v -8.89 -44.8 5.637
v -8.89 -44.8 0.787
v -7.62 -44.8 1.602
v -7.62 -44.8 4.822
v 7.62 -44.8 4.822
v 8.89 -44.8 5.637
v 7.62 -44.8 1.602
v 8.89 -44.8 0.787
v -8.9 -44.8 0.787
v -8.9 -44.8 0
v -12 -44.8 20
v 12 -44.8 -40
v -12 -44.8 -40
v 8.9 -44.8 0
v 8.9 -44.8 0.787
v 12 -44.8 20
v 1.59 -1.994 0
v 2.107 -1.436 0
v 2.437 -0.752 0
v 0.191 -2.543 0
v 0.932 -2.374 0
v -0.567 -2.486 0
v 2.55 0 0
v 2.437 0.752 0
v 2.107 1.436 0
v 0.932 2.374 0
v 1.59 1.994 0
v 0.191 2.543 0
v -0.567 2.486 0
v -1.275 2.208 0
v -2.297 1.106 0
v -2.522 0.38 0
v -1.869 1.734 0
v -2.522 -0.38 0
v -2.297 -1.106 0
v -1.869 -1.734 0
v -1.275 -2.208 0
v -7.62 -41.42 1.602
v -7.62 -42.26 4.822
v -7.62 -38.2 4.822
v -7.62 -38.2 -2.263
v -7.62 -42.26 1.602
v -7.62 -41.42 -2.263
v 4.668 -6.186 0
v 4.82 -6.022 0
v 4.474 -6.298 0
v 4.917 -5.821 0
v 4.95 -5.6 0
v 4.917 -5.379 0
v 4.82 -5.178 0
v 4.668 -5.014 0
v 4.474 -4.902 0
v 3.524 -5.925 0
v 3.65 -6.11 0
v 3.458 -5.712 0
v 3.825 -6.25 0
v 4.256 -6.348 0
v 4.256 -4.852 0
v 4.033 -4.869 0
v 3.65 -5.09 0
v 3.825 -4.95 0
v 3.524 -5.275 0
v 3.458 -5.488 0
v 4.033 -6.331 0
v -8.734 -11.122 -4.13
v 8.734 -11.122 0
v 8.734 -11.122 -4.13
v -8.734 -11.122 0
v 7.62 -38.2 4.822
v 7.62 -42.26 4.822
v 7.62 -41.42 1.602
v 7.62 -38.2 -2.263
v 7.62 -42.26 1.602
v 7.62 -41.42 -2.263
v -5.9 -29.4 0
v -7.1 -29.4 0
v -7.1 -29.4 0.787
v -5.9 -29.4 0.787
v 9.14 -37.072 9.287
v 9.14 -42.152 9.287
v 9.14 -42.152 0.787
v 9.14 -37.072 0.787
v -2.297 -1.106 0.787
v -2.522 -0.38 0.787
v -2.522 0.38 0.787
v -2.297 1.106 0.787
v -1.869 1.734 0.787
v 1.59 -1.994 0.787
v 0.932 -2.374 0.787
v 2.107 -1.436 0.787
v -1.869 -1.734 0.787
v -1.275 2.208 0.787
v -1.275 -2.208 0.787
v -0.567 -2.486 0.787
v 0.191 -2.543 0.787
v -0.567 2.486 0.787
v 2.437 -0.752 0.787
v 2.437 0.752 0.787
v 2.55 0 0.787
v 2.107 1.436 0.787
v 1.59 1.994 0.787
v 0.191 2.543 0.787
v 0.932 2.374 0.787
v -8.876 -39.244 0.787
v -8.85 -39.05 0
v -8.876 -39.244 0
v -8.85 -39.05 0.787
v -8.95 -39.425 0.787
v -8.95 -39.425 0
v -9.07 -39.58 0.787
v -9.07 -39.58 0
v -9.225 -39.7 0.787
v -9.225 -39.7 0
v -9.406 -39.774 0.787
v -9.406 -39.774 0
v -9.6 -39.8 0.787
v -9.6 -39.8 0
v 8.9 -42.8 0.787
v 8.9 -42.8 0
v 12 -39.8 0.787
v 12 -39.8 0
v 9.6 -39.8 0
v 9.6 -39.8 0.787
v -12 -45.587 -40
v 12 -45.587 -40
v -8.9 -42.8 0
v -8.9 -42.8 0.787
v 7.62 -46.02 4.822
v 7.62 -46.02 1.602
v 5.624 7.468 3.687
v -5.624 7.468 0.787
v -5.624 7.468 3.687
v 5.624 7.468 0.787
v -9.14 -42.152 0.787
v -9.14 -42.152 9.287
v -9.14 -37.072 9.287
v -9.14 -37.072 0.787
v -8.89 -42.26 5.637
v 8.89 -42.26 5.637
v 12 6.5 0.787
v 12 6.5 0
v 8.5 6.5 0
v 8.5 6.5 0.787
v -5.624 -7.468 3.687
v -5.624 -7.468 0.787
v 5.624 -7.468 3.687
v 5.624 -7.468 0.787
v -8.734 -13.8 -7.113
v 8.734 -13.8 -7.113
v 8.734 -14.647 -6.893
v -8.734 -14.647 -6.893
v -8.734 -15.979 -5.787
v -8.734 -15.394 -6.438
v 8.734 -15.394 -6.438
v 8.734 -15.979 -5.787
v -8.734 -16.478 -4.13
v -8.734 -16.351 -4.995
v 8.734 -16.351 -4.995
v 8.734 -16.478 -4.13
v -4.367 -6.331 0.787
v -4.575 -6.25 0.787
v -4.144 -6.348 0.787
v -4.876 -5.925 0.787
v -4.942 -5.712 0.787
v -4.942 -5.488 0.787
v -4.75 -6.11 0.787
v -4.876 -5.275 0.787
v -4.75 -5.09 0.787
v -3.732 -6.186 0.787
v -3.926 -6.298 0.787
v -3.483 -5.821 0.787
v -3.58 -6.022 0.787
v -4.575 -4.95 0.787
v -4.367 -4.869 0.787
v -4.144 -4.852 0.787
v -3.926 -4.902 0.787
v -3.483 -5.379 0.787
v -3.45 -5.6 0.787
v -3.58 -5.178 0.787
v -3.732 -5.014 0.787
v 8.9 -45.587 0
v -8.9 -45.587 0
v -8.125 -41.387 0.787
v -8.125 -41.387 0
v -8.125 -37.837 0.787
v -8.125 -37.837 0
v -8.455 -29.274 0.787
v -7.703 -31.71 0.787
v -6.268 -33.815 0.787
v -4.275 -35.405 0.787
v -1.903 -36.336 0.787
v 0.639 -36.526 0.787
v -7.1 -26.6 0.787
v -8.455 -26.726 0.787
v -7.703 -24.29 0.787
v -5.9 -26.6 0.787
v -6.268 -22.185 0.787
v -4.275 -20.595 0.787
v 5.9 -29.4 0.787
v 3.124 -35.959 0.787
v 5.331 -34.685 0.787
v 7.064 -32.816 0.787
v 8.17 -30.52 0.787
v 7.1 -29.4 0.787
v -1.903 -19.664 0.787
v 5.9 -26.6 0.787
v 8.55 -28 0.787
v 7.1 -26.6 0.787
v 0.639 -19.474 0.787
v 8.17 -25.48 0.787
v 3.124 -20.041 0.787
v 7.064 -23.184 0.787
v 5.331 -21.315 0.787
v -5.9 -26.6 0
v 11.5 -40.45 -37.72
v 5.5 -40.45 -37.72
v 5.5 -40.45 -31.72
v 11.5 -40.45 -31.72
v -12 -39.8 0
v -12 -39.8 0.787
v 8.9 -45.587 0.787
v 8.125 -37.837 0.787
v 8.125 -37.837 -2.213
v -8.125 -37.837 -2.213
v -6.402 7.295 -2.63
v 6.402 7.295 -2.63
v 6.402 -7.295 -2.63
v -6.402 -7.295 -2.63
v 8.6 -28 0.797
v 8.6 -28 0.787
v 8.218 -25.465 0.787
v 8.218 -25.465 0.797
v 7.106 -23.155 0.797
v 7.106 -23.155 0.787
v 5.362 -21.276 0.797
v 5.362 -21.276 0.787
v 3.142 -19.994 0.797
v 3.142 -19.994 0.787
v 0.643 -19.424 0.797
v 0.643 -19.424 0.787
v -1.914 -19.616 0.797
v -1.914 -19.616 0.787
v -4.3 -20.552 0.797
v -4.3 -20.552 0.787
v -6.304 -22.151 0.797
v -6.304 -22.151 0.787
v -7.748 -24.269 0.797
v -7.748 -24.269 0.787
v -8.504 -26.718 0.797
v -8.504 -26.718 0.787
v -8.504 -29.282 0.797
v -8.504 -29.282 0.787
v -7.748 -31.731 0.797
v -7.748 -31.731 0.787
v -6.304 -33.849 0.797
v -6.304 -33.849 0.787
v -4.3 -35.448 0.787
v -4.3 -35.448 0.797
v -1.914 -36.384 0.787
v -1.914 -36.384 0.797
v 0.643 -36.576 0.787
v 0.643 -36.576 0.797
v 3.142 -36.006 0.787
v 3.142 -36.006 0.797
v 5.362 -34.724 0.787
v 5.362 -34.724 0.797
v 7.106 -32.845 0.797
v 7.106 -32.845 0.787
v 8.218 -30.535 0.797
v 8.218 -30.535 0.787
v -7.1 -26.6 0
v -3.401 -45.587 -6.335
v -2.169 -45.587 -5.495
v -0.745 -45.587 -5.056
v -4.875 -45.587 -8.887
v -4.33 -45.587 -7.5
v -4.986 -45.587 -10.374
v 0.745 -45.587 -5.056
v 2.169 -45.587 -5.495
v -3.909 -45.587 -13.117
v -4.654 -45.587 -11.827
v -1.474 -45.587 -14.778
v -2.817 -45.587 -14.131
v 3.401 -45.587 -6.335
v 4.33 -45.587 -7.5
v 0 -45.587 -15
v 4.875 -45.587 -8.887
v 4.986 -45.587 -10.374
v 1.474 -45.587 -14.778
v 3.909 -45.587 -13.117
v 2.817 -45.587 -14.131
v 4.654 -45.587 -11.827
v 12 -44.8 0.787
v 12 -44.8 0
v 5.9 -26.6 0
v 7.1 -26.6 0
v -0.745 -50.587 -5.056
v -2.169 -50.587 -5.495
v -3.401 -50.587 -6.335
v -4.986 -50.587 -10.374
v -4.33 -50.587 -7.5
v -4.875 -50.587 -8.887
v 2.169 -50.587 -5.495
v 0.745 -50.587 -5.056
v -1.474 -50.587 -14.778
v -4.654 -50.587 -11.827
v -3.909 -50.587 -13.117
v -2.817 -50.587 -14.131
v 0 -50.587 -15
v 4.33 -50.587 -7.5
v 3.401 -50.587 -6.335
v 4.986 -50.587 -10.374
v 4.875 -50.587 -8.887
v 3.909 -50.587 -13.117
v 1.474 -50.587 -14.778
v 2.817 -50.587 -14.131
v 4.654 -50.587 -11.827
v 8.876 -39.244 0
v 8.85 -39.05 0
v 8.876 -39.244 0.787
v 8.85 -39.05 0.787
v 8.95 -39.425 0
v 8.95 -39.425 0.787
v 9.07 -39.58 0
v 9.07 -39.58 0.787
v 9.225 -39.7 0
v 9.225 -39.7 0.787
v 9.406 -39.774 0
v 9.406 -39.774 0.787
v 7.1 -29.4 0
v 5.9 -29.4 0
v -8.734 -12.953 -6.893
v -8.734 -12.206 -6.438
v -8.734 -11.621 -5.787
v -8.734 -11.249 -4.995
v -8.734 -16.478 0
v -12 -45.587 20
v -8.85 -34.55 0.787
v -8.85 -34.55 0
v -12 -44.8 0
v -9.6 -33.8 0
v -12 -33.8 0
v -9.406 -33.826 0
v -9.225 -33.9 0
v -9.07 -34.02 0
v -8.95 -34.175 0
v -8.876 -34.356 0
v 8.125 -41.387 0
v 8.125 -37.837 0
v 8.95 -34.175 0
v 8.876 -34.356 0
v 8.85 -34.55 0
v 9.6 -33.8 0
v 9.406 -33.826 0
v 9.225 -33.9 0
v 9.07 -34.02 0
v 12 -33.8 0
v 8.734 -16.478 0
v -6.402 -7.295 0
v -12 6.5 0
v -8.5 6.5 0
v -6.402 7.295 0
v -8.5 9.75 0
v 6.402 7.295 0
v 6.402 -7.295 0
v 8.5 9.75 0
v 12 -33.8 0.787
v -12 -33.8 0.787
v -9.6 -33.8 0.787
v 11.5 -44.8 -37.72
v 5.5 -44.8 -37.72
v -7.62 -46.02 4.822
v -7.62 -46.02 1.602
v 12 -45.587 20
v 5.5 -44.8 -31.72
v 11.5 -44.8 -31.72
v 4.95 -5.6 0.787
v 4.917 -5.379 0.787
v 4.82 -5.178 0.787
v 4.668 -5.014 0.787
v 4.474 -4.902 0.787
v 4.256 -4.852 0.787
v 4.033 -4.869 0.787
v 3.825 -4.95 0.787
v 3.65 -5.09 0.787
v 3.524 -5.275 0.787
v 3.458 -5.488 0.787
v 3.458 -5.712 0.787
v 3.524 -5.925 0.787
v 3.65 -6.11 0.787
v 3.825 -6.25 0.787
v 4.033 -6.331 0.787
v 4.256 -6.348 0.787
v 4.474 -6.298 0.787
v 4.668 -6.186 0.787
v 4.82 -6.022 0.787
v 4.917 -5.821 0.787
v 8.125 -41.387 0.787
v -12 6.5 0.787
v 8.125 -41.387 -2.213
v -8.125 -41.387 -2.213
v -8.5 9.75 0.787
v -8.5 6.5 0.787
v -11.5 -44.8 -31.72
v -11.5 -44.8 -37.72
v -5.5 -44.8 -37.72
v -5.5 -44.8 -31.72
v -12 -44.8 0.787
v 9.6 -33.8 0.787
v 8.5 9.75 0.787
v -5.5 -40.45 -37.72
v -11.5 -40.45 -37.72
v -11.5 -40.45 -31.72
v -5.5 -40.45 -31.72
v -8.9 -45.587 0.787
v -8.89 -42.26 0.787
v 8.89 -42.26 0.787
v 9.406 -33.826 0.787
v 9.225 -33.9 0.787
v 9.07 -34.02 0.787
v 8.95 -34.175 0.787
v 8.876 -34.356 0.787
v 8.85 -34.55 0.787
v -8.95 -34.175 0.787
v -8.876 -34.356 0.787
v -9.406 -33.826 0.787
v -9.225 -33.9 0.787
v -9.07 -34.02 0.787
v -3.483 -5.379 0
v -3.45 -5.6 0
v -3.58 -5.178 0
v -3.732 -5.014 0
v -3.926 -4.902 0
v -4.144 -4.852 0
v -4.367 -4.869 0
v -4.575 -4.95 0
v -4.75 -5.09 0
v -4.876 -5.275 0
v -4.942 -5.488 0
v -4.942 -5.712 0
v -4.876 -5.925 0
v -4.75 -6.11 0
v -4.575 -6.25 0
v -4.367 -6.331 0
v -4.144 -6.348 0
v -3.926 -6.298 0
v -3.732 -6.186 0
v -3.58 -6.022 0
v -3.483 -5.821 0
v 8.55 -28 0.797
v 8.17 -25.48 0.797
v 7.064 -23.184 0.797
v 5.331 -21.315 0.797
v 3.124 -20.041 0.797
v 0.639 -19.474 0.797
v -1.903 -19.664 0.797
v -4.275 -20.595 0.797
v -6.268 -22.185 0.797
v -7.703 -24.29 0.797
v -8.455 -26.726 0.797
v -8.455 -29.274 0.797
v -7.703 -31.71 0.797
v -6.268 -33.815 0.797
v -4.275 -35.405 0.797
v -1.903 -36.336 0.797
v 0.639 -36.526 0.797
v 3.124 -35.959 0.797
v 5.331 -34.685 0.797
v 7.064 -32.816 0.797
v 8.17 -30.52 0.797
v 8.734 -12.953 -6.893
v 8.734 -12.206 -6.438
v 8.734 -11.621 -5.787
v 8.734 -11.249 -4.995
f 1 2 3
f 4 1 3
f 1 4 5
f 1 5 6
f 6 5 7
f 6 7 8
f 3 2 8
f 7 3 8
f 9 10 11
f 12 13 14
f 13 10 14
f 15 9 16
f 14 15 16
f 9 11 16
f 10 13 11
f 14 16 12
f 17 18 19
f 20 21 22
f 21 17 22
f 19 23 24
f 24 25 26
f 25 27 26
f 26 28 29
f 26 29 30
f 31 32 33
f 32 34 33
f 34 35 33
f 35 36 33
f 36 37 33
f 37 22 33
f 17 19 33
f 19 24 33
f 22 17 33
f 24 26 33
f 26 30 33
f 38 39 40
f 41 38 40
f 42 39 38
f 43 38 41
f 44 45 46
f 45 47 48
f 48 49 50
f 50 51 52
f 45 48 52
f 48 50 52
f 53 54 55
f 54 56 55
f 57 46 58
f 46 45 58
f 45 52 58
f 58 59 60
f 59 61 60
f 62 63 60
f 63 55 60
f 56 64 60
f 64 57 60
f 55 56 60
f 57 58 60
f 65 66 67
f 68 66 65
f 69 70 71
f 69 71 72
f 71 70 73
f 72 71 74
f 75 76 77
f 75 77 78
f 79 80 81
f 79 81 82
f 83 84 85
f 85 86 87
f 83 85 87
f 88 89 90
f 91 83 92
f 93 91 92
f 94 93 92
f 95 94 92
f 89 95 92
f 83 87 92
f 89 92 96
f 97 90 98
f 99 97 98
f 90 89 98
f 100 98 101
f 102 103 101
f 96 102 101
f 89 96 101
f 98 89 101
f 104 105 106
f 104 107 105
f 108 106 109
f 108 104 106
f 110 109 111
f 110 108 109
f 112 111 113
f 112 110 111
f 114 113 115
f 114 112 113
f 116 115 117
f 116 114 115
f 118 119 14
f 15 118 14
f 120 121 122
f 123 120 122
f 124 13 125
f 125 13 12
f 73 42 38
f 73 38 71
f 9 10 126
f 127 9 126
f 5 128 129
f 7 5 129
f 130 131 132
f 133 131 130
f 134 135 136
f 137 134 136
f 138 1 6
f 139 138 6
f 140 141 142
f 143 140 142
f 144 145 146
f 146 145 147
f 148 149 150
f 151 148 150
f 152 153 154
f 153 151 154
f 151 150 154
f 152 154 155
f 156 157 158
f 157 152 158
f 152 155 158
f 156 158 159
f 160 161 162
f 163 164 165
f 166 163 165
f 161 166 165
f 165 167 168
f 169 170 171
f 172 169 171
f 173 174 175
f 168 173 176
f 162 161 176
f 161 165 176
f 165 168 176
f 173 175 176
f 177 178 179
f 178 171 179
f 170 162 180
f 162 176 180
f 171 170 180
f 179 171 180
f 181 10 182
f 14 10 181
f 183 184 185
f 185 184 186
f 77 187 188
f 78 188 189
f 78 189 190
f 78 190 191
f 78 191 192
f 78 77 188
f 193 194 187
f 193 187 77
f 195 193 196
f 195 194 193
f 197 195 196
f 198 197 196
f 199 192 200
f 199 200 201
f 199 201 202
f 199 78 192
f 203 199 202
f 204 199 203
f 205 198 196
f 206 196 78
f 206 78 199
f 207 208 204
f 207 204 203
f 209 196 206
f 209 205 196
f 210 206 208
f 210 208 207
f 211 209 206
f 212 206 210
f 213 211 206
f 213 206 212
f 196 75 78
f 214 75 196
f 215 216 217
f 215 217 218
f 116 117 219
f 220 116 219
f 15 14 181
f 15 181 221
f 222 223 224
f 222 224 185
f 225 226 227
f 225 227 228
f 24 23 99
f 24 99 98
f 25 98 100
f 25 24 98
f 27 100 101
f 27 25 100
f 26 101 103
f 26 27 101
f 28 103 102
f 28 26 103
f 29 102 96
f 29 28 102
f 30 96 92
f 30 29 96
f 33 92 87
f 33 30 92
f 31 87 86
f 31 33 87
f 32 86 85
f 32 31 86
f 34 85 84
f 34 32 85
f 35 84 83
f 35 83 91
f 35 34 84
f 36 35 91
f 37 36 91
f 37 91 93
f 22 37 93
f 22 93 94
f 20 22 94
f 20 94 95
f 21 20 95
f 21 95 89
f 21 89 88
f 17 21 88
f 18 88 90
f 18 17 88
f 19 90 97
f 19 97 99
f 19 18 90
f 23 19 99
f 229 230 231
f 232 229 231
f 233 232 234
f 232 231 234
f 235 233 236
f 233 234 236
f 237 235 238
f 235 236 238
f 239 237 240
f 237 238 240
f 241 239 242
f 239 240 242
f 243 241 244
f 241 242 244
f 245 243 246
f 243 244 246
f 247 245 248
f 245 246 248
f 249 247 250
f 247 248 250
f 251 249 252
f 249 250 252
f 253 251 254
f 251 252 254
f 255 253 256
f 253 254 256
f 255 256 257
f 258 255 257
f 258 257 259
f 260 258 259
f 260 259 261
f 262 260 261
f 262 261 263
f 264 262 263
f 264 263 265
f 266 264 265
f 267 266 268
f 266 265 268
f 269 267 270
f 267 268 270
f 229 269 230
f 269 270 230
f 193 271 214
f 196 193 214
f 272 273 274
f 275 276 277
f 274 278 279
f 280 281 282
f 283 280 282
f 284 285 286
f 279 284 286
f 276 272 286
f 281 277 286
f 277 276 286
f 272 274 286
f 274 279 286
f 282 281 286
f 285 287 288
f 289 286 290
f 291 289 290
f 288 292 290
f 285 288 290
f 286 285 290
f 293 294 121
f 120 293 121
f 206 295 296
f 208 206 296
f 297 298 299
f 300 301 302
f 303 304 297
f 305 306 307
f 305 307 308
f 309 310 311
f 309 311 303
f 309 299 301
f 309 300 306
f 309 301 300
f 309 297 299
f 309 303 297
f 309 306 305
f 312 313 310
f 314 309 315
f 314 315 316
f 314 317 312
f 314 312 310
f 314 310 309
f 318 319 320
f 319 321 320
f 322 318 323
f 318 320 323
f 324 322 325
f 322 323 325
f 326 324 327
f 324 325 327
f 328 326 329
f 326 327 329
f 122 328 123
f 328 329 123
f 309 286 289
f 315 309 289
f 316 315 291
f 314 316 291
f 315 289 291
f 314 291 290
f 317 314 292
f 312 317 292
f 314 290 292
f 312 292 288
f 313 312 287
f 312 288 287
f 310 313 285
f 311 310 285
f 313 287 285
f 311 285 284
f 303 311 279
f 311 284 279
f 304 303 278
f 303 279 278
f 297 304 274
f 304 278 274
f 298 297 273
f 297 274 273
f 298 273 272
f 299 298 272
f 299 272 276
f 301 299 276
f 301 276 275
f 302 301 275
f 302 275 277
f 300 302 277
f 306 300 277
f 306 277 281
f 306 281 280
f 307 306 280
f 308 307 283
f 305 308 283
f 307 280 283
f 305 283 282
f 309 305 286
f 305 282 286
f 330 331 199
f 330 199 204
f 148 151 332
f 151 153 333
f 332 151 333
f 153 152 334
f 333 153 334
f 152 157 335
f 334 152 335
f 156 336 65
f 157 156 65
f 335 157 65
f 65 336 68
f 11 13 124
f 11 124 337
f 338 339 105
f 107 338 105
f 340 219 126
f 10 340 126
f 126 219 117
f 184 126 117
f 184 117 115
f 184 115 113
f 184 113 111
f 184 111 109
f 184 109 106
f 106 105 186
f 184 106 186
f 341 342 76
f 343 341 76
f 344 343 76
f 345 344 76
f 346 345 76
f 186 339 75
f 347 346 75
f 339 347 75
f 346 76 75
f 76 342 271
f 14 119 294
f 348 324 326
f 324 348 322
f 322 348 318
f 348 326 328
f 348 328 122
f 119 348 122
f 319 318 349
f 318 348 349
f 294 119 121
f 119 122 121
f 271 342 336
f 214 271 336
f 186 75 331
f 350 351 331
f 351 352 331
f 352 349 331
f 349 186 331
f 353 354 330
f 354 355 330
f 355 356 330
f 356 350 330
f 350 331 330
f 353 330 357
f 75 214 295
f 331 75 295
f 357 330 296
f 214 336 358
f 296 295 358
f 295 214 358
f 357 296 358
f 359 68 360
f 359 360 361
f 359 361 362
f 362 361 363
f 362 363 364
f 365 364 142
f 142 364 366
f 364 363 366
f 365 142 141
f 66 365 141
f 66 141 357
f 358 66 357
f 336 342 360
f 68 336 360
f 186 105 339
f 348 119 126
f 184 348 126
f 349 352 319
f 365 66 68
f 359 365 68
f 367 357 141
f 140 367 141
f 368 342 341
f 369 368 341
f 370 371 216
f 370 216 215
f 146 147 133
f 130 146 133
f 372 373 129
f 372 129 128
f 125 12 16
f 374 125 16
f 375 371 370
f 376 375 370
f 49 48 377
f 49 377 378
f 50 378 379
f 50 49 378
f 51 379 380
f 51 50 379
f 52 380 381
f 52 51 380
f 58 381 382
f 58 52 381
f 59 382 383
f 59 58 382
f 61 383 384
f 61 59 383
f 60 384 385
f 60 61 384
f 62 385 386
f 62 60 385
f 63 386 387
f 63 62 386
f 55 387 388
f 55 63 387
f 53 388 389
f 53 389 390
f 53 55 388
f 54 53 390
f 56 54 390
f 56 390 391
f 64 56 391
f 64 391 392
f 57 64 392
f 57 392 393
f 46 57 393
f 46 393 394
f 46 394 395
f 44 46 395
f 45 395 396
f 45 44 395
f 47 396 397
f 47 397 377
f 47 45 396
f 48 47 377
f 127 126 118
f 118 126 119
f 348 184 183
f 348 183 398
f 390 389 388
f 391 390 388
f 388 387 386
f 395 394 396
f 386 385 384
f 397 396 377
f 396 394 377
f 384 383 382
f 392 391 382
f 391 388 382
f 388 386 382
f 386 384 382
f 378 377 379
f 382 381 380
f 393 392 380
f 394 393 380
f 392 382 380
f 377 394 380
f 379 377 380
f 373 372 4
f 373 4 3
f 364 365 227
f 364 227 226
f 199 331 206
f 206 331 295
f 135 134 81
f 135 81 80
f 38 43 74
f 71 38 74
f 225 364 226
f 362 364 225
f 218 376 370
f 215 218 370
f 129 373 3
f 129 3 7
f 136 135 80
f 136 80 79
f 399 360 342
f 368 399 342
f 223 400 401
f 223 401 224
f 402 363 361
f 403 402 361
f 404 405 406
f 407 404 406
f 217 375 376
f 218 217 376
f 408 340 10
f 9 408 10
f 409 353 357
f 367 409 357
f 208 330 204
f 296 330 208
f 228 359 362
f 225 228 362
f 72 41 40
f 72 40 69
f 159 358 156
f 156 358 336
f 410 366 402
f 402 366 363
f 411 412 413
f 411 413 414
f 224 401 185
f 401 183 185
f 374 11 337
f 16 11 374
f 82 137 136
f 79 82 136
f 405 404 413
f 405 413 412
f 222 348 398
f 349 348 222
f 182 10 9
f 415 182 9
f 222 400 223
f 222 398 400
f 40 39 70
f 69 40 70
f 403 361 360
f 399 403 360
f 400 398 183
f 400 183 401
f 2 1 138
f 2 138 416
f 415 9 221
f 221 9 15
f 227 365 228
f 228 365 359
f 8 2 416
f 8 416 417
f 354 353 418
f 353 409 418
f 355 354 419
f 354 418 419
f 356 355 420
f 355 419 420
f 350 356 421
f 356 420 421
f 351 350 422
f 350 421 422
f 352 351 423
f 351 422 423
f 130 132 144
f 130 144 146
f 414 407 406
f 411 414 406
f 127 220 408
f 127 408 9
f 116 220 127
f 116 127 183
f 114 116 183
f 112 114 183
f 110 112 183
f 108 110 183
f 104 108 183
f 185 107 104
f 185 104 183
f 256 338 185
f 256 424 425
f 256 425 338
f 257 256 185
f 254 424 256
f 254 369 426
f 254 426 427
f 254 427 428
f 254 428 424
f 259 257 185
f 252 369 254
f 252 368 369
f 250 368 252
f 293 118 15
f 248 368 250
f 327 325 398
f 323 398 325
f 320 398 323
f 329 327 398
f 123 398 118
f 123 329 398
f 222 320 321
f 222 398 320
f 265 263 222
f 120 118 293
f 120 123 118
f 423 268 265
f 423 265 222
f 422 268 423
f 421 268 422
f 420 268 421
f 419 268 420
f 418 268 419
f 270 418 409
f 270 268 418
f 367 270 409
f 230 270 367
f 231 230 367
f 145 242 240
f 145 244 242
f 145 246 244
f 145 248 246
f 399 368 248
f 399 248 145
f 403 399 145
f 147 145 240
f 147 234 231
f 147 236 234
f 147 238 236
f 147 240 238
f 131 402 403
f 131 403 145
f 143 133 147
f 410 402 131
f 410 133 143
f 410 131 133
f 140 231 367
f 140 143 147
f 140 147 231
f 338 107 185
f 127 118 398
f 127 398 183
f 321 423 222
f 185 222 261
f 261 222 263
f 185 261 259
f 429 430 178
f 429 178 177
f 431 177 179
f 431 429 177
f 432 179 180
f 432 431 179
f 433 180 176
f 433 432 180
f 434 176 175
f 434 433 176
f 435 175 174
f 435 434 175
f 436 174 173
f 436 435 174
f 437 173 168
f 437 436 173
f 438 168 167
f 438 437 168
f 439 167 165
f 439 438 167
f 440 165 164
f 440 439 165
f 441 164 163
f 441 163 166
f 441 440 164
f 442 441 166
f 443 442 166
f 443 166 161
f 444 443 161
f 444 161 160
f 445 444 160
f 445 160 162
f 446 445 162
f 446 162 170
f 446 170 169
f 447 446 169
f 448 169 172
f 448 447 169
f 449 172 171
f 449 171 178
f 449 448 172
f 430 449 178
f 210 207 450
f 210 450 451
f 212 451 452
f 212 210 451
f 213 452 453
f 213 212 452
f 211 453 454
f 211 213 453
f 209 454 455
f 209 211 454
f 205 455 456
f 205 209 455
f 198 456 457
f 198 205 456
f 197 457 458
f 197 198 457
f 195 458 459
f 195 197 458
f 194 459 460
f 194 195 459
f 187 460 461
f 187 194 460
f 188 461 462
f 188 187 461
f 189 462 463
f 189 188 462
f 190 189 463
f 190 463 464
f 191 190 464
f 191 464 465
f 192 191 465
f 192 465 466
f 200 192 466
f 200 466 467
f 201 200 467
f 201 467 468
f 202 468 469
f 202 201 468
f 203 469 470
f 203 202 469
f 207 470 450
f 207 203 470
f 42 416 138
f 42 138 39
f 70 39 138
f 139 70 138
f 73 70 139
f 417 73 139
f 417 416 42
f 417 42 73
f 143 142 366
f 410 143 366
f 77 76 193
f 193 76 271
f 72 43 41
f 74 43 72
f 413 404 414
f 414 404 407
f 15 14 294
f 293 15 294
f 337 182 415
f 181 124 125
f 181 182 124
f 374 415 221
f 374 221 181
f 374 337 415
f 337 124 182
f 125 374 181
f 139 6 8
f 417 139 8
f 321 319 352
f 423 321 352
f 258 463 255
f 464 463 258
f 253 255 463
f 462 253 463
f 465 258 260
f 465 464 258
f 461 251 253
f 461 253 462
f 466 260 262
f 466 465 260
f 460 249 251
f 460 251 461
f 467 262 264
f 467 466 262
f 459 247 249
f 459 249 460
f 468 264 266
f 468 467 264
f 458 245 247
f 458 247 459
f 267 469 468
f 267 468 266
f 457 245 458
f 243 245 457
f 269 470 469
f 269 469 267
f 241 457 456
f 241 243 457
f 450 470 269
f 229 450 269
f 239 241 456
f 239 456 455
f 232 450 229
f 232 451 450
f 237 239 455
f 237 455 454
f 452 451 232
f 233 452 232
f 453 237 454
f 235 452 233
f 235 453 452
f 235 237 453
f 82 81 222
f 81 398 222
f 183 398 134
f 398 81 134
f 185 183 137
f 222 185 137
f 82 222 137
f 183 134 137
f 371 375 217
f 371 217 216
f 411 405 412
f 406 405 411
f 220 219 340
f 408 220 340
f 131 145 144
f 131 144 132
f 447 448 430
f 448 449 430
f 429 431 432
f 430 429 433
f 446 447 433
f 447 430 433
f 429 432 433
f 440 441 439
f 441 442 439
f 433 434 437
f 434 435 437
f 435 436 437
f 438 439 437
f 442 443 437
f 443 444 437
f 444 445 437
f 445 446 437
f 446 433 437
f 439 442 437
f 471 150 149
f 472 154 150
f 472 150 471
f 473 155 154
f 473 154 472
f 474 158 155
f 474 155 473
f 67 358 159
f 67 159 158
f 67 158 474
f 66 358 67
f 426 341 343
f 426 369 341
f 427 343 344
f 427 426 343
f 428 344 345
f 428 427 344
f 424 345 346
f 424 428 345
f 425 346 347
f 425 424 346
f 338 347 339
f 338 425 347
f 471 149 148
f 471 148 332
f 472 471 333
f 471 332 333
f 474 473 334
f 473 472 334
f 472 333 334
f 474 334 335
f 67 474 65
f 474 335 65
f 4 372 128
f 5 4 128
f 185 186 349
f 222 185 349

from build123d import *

# Parameters (mm, degrees)
SKETCH1_R                         = 2.55
SKETCH1_R_2                       = 0.75
SKETCH1_W                         = 1.2
SKETCH1_H                         = 2.8
SKETCH1_W_2                       = 16.25
SKETCH1_H_2                       = 3.55
BOSS_EXTRUDE3_DEPTH               = 0.7874
SKETCH6_R                         = 8.6
SKETCH6_R_2                       = 8.55
EXTRUDE_THIN1_DEPTH               = 0.01
SKETCH2_W                         = 24
SKETCH2_H                         = 60
SKETCH2_W_2                       = 17.8
SKETCH2_H_2                       = 0.7874
BOSS_EXTRUDE6_DEPTH               = 0.7874
SKETCH3_R                         = 5
BOSS_EXTRUDE7_DEPTH               = 5
SKETCH4_W                         = 6
SKETCH4_H                         = 6
BOSS_EXTRUDE8_DEPTH               = 4.35
BOSS_EXTRUDE8_2_DEPTH             = 4.35
SKETCH5_W                         = 17.468941522
SKETCH5_H                         = 5.356170352
BOSS_EXTRUDE9_DEPTH               = 7.13
FILLET1_R                         = 3
FEMALE_START                      = -8.125
FEMALE_CONNECTOR_DEPTH            = 16.25
FEMALE_START_2                    = -9.14
FEMALE_CONNECTOR_2_OUTLINE_W      = 5.08
FEMALE_CONNECTOR_2_OUTLINE_H      = 8.5
FEMALE_CONNECTOR_2_DEPTH          = 18.28
SKETCH10_W                        = 12.803875086
SKETCH10_H                        = 14.58902636
BOSS_EXTRUDE11_DEPTH              = 2.63
PCB_START                         = -41.141819053
PCB_CONNECTOR_QUARK_OUTLINE_W     = 15.24
PCB_CONNECTOR_QUARK_OUTLINE_H     = 3.22
PCB_CONNECTOR_QUARK_DEPTH         = 12.44
PCB_START_2                       = -31.921819053
PCB_CONNECTOR_QUARK_2_OUTLINE_W   = 15.24
PCB_CONNECTOR_QUARK_2_OUTLINE_H   = 3.865
PCB_CONNECTOR_QUARK_2_DEPTH       = 3.22
PCB_START_3                       = -35.301819053
PCB_CONNECTOR_QUARK_3_OUTLINE_W   = 17.78
PCB_CONNECTOR_QUARK_3_OUTLINE_H   = 4.85
PCB_CONNECTOR_QUARK_3_OUTLINE_W_2 = 15.24
PCB_CONNECTOR_QUARK_3_OUTLINE_H_2 = 3.22
PCB_CONNECTOR_QUARK_3_DEPTH       = 2.54
FILLET2_R                         = 0.75
SKETCH16_W                        = 11.24724057
SKETCH16_H                        = 14.93660129
BOSS_EXTRUDE12_DEPTH              = 2.9
SKETCH17_W                        = 3.22
SKETCH17_H                        = 4.619876858
CUT_EXTRUDE1_DEPTH                = 23


with BuildPart() as part:
    # Sketch1 → Boss-Extrude3 (new body)
    with BuildSketch(Plane.XY):
        Polygon((8.5, 9.75), (-8.5, 9.75), (-8.5, 6.5), (-12, 6.5), (-12, -33.8), (-8.85, -33.8), (-8.85, -39.8), (-12, -39.8), (-12, -44.8), (-8.9, -44.8), (-8.9, -42.8), (8.9, -42.8), (8.9, -44.8), (12, -44.8), (12, -39.8), (8.85, -39.8), (8.85, -33.8), (12, -33.8), (12, 6.5), (8.5, 6.5), align=None)
        Circle(SKETCH1_R, mode=Mode.SUBTRACT)
        with Locations((-4.2, -5.6)):
            Circle(SKETCH1_R_2, mode=Mode.SUBTRACT)
        with Locations((4.2, -5.6)):
            Circle(SKETCH1_R_2, mode=Mode.SUBTRACT)
        with Locations((6.5, -28)):
            Rectangle(SKETCH1_W, SKETCH1_H, mode=Mode.SUBTRACT)
        with Locations((-6.5, -28)):
            Rectangle(SKETCH1_W, SKETCH1_H, mode=Mode.SUBTRACT)
        with Locations((0, -39.6122)):
            Rectangle(SKETCH1_W_2, SKETCH1_H_2, mode=Mode.SUBTRACT)
    extrude(amount=BOSS_EXTRUDE3_DEPTH)

    # Sketch6 → Extrude-Thin1 (add)
    with BuildSketch(Plane.XY.offset(0.7874)):
        with Locations((0, -28)):
            Circle(SKETCH6_R)
        with Locations((0, -28)):
            Circle(SKETCH6_R_2, mode=Mode.SUBTRACT)
    extrude(amount=EXTRUDE_THIN1_DEPTH)

    # Sketch5 → Boss-Extrude9 (add)
    with BuildSketch(Plane(origin=(0, 0, 0), x_dir=(-1, 0, 0), z_dir=(0, 0, -1))):
        with Locations((0, -13.8)):
            Rectangle(SKETCH5_W, SKETCH5_H)
    extrude(amount=BOSS_EXTRUDE9_DEPTH)

    # Fillet1
    # the kernel refuses this fillet: 3 mm, written as the material it takes off along each edge
    with BuildSketch(Plane(origin=(16.234470761, -16.478085176, -7.13), x_dir=(0, 0, 1), z_dir=(-1, 0, 0)), Plane(origin=(-16.234470761, -11.121914824, -7.13), x_dir=(0, 0, 1), z_dir=(1, 0, 0))) as fillet1_piece_1:
        with BuildLine():
            CenterArc((FILLET1_R, FILLET1_R), FILLET1_R, 180, 90)
            Line((0, FILLET1_R), (0, 0))
            Line((0, 0), (FILLET1_R, 0))
        make_face()
    extrude(amount=32.468941522, mode=Mode.SUBTRACT)

    # Sketch10 → Boss-Extrude11 (add)
    with BuildSketch(Plane(origin=(0, 0, 0), x_dir=(-1, 0, 0), z_dir=(0, 0, -1))):
        Rectangle(SKETCH10_W, SKETCH10_H)
    extrude(amount=BOSS_EXTRUDE11_DEPTH)

    # Fillet2
    fillet2_edges = [part.edges().sort_by_distance(p)[0] for p in [
        (-8.85, -39.8, 0.3937),
        (-8.85, -33.8, 0.3937),
        (8.85, -33.8, 0.3937),
        (8.85, -39.8, 0.3937),
    ]]
    fillet(fillet2_edges, radius=FILLET2_R)

    # Sketch16 → Boss-Extrude12 (add)
    with BuildSketch(Plane.XY.offset(0.7874)):
        Rectangle(SKETCH16_W, SKETCH16_H)
    extrude(amount=BOSS_EXTRUDE12_DEPTH)


with BuildPart() as body_2:
    # Sketch2 → Boss-Extrude6 (new body)
    with BuildSketch(Plane.XZ.offset(44.8)):
        with Locations((0, -10)):
            Rectangle(SKETCH2_W, SKETCH2_H)
        with Locations((0, 0.3937)):
            Rectangle(SKETCH2_W_2, SKETCH2_H_2, mode=Mode.SUBTRACT)
    extrude(amount=BOSS_EXTRUDE6_DEPTH)


with BuildPart() as body_3:
    # Sketch3 → Boss-Extrude7 (new body)
    with BuildSketch(Plane.XZ.offset(45.5874)):
        with Locations(Location((0, -10, 0), (0, 0, 270))):
            Circle(SKETCH3_R)
    extrude(amount=BOSS_EXTRUDE7_DEPTH)


with BuildPart() as body_4:
    # Sketch4 → Boss-Extrude8 (new body)
    with BuildSketch(Plane(origin=(0, -44.8, 0), x_dir=(1, 0, 0), z_dir=(0, 1, 0))):
        with Locations((-8.5, 34.72)):
            Rectangle(SKETCH4_W, SKETCH4_H)
    extrude(amount=BOSS_EXTRUDE8_DEPTH)


with BuildPart() as body_5:
    # Sketch4 → Boss-Extrude8 2 (new body)
    with BuildSketch(Plane(origin=(0, -44.8, 0), x_dir=(1, 0, 0), z_dir=(0, 1, 0))):
        with Locations((8.5, 34.72)):
            Rectangle(SKETCH4_W, SKETCH4_H)
    extrude(amount=BOSS_EXTRUDE8_2_DEPTH)


with BuildPart() as body_6:
    # Female Connector: read off the stored shape, not the designer's step
    # Female Connector outline → Female Connector (new body)
    with BuildSketch(Plane.YZ.offset(FEMALE_START)):
        Polygon((-37.8372, -2.2126), (-37.8372, 0.7874), (-37.0722, 0.7874), (-37.0722, 9.2874), (-42.1522, 9.2874), (-42.1522, 0.7874), (-41.3872, 0.7874), (-41.3872, -2.2126), align=None)
    extrude(amount=FEMALE_CONNECTOR_DEPTH)

    # Female Connector 2 outline → Female Connector 2 (add)
    with BuildSketch(Plane.YZ.offset(FEMALE_START_2)):
        with Locations((-39.6122, 5.0374)):
            Rectangle(FEMALE_CONNECTOR_2_OUTLINE_W, FEMALE_CONNECTOR_2_OUTLINE_H)
    extrude(amount=FEMALE_CONNECTOR_2_DEPTH)


with BuildPart() as body_7:
    # PCB CONNECTOR_Quark: read off the stored shape, not the designer's step
    # PCB CONNECTOR_Quark outline → PCB CONNECTOR_Quark (new body)
    with BuildSketch(Plane(origin=(0, 0, 0), x_dir=(1, 0, 0), z_dir=(0, 1, 0)).offset(PCB_START)):
        with Locations((12.610768587, -17.421401355)):
            Rectangle(PCB_CONNECTOR_QUARK_OUTLINE_W, PCB_CONNECTOR_QUARK_OUTLINE_H)
    extrude(amount=PCB_CONNECTOR_QUARK_DEPTH)

    # PCB CONNECTOR_Quark 2 outline → PCB CONNECTOR_Quark 2 (add)
    with BuildSketch(Plane(origin=(0, 0, 0), x_dir=(1, 0, 0), z_dir=(0, 1, 0)).offset(PCB_START_2)):
        with Locations((12.610768587, -13.878901355)):
            Rectangle(PCB_CONNECTOR_QUARK_2_OUTLINE_W, PCB_CONNECTOR_QUARK_2_OUTLINE_H)
    extrude(amount=PCB_CONNECTOR_QUARK_2_DEPTH)

    # PCB CONNECTOR_Quark 3 outline → PCB CONNECTOR_Quark 3 (add)
    with BuildSketch(Plane(origin=(0, 0, 0), x_dir=(1, 0, 0), z_dir=(0, 1, 0)).offset(PCB_START_3)):
        with Locations((12.610768587, -17.421401355)):
            Rectangle(PCB_CONNECTOR_QUARK_3_OUTLINE_W, PCB_CONNECTOR_QUARK_3_OUTLINE_H)
        with Locations((12.610768587, -17.421401355)):
            Rectangle(PCB_CONNECTOR_QUARK_3_OUTLINE_W_2, PCB_CONNECTOR_QUARK_3_OUTLINE_H_2, mode=Mode.SUBTRACT)
    extrude(amount=PCB_CONNECTOR_QUARK_3_DEPTH)


with BuildPart() as body_7_1:
    # Body-Move/Copy6: read off the stored shape, not the designer's step
    # Body-Move/Copy6: moved
    add(body_7.part.moved(Location((-12.6107686, -9.4981809, -14.2090014))))

    # Sketch17 → Cut-Extrude1 (cut)
    with BuildSketch(Plane.ZY.offset(7.62)):
        with Locations((3.2124, -48.330061571)):
            Rectangle(SKETCH17_W, SKETCH17_H)
    extrude(amount=-CUT_EXTRUDE1_DEPTH, mode=Mode.SUBTRACT)


solid = Compound([part.part, body_2.part, body_3.part, body_4.part, body_5.part, body_6.part, body_7_1.part])
